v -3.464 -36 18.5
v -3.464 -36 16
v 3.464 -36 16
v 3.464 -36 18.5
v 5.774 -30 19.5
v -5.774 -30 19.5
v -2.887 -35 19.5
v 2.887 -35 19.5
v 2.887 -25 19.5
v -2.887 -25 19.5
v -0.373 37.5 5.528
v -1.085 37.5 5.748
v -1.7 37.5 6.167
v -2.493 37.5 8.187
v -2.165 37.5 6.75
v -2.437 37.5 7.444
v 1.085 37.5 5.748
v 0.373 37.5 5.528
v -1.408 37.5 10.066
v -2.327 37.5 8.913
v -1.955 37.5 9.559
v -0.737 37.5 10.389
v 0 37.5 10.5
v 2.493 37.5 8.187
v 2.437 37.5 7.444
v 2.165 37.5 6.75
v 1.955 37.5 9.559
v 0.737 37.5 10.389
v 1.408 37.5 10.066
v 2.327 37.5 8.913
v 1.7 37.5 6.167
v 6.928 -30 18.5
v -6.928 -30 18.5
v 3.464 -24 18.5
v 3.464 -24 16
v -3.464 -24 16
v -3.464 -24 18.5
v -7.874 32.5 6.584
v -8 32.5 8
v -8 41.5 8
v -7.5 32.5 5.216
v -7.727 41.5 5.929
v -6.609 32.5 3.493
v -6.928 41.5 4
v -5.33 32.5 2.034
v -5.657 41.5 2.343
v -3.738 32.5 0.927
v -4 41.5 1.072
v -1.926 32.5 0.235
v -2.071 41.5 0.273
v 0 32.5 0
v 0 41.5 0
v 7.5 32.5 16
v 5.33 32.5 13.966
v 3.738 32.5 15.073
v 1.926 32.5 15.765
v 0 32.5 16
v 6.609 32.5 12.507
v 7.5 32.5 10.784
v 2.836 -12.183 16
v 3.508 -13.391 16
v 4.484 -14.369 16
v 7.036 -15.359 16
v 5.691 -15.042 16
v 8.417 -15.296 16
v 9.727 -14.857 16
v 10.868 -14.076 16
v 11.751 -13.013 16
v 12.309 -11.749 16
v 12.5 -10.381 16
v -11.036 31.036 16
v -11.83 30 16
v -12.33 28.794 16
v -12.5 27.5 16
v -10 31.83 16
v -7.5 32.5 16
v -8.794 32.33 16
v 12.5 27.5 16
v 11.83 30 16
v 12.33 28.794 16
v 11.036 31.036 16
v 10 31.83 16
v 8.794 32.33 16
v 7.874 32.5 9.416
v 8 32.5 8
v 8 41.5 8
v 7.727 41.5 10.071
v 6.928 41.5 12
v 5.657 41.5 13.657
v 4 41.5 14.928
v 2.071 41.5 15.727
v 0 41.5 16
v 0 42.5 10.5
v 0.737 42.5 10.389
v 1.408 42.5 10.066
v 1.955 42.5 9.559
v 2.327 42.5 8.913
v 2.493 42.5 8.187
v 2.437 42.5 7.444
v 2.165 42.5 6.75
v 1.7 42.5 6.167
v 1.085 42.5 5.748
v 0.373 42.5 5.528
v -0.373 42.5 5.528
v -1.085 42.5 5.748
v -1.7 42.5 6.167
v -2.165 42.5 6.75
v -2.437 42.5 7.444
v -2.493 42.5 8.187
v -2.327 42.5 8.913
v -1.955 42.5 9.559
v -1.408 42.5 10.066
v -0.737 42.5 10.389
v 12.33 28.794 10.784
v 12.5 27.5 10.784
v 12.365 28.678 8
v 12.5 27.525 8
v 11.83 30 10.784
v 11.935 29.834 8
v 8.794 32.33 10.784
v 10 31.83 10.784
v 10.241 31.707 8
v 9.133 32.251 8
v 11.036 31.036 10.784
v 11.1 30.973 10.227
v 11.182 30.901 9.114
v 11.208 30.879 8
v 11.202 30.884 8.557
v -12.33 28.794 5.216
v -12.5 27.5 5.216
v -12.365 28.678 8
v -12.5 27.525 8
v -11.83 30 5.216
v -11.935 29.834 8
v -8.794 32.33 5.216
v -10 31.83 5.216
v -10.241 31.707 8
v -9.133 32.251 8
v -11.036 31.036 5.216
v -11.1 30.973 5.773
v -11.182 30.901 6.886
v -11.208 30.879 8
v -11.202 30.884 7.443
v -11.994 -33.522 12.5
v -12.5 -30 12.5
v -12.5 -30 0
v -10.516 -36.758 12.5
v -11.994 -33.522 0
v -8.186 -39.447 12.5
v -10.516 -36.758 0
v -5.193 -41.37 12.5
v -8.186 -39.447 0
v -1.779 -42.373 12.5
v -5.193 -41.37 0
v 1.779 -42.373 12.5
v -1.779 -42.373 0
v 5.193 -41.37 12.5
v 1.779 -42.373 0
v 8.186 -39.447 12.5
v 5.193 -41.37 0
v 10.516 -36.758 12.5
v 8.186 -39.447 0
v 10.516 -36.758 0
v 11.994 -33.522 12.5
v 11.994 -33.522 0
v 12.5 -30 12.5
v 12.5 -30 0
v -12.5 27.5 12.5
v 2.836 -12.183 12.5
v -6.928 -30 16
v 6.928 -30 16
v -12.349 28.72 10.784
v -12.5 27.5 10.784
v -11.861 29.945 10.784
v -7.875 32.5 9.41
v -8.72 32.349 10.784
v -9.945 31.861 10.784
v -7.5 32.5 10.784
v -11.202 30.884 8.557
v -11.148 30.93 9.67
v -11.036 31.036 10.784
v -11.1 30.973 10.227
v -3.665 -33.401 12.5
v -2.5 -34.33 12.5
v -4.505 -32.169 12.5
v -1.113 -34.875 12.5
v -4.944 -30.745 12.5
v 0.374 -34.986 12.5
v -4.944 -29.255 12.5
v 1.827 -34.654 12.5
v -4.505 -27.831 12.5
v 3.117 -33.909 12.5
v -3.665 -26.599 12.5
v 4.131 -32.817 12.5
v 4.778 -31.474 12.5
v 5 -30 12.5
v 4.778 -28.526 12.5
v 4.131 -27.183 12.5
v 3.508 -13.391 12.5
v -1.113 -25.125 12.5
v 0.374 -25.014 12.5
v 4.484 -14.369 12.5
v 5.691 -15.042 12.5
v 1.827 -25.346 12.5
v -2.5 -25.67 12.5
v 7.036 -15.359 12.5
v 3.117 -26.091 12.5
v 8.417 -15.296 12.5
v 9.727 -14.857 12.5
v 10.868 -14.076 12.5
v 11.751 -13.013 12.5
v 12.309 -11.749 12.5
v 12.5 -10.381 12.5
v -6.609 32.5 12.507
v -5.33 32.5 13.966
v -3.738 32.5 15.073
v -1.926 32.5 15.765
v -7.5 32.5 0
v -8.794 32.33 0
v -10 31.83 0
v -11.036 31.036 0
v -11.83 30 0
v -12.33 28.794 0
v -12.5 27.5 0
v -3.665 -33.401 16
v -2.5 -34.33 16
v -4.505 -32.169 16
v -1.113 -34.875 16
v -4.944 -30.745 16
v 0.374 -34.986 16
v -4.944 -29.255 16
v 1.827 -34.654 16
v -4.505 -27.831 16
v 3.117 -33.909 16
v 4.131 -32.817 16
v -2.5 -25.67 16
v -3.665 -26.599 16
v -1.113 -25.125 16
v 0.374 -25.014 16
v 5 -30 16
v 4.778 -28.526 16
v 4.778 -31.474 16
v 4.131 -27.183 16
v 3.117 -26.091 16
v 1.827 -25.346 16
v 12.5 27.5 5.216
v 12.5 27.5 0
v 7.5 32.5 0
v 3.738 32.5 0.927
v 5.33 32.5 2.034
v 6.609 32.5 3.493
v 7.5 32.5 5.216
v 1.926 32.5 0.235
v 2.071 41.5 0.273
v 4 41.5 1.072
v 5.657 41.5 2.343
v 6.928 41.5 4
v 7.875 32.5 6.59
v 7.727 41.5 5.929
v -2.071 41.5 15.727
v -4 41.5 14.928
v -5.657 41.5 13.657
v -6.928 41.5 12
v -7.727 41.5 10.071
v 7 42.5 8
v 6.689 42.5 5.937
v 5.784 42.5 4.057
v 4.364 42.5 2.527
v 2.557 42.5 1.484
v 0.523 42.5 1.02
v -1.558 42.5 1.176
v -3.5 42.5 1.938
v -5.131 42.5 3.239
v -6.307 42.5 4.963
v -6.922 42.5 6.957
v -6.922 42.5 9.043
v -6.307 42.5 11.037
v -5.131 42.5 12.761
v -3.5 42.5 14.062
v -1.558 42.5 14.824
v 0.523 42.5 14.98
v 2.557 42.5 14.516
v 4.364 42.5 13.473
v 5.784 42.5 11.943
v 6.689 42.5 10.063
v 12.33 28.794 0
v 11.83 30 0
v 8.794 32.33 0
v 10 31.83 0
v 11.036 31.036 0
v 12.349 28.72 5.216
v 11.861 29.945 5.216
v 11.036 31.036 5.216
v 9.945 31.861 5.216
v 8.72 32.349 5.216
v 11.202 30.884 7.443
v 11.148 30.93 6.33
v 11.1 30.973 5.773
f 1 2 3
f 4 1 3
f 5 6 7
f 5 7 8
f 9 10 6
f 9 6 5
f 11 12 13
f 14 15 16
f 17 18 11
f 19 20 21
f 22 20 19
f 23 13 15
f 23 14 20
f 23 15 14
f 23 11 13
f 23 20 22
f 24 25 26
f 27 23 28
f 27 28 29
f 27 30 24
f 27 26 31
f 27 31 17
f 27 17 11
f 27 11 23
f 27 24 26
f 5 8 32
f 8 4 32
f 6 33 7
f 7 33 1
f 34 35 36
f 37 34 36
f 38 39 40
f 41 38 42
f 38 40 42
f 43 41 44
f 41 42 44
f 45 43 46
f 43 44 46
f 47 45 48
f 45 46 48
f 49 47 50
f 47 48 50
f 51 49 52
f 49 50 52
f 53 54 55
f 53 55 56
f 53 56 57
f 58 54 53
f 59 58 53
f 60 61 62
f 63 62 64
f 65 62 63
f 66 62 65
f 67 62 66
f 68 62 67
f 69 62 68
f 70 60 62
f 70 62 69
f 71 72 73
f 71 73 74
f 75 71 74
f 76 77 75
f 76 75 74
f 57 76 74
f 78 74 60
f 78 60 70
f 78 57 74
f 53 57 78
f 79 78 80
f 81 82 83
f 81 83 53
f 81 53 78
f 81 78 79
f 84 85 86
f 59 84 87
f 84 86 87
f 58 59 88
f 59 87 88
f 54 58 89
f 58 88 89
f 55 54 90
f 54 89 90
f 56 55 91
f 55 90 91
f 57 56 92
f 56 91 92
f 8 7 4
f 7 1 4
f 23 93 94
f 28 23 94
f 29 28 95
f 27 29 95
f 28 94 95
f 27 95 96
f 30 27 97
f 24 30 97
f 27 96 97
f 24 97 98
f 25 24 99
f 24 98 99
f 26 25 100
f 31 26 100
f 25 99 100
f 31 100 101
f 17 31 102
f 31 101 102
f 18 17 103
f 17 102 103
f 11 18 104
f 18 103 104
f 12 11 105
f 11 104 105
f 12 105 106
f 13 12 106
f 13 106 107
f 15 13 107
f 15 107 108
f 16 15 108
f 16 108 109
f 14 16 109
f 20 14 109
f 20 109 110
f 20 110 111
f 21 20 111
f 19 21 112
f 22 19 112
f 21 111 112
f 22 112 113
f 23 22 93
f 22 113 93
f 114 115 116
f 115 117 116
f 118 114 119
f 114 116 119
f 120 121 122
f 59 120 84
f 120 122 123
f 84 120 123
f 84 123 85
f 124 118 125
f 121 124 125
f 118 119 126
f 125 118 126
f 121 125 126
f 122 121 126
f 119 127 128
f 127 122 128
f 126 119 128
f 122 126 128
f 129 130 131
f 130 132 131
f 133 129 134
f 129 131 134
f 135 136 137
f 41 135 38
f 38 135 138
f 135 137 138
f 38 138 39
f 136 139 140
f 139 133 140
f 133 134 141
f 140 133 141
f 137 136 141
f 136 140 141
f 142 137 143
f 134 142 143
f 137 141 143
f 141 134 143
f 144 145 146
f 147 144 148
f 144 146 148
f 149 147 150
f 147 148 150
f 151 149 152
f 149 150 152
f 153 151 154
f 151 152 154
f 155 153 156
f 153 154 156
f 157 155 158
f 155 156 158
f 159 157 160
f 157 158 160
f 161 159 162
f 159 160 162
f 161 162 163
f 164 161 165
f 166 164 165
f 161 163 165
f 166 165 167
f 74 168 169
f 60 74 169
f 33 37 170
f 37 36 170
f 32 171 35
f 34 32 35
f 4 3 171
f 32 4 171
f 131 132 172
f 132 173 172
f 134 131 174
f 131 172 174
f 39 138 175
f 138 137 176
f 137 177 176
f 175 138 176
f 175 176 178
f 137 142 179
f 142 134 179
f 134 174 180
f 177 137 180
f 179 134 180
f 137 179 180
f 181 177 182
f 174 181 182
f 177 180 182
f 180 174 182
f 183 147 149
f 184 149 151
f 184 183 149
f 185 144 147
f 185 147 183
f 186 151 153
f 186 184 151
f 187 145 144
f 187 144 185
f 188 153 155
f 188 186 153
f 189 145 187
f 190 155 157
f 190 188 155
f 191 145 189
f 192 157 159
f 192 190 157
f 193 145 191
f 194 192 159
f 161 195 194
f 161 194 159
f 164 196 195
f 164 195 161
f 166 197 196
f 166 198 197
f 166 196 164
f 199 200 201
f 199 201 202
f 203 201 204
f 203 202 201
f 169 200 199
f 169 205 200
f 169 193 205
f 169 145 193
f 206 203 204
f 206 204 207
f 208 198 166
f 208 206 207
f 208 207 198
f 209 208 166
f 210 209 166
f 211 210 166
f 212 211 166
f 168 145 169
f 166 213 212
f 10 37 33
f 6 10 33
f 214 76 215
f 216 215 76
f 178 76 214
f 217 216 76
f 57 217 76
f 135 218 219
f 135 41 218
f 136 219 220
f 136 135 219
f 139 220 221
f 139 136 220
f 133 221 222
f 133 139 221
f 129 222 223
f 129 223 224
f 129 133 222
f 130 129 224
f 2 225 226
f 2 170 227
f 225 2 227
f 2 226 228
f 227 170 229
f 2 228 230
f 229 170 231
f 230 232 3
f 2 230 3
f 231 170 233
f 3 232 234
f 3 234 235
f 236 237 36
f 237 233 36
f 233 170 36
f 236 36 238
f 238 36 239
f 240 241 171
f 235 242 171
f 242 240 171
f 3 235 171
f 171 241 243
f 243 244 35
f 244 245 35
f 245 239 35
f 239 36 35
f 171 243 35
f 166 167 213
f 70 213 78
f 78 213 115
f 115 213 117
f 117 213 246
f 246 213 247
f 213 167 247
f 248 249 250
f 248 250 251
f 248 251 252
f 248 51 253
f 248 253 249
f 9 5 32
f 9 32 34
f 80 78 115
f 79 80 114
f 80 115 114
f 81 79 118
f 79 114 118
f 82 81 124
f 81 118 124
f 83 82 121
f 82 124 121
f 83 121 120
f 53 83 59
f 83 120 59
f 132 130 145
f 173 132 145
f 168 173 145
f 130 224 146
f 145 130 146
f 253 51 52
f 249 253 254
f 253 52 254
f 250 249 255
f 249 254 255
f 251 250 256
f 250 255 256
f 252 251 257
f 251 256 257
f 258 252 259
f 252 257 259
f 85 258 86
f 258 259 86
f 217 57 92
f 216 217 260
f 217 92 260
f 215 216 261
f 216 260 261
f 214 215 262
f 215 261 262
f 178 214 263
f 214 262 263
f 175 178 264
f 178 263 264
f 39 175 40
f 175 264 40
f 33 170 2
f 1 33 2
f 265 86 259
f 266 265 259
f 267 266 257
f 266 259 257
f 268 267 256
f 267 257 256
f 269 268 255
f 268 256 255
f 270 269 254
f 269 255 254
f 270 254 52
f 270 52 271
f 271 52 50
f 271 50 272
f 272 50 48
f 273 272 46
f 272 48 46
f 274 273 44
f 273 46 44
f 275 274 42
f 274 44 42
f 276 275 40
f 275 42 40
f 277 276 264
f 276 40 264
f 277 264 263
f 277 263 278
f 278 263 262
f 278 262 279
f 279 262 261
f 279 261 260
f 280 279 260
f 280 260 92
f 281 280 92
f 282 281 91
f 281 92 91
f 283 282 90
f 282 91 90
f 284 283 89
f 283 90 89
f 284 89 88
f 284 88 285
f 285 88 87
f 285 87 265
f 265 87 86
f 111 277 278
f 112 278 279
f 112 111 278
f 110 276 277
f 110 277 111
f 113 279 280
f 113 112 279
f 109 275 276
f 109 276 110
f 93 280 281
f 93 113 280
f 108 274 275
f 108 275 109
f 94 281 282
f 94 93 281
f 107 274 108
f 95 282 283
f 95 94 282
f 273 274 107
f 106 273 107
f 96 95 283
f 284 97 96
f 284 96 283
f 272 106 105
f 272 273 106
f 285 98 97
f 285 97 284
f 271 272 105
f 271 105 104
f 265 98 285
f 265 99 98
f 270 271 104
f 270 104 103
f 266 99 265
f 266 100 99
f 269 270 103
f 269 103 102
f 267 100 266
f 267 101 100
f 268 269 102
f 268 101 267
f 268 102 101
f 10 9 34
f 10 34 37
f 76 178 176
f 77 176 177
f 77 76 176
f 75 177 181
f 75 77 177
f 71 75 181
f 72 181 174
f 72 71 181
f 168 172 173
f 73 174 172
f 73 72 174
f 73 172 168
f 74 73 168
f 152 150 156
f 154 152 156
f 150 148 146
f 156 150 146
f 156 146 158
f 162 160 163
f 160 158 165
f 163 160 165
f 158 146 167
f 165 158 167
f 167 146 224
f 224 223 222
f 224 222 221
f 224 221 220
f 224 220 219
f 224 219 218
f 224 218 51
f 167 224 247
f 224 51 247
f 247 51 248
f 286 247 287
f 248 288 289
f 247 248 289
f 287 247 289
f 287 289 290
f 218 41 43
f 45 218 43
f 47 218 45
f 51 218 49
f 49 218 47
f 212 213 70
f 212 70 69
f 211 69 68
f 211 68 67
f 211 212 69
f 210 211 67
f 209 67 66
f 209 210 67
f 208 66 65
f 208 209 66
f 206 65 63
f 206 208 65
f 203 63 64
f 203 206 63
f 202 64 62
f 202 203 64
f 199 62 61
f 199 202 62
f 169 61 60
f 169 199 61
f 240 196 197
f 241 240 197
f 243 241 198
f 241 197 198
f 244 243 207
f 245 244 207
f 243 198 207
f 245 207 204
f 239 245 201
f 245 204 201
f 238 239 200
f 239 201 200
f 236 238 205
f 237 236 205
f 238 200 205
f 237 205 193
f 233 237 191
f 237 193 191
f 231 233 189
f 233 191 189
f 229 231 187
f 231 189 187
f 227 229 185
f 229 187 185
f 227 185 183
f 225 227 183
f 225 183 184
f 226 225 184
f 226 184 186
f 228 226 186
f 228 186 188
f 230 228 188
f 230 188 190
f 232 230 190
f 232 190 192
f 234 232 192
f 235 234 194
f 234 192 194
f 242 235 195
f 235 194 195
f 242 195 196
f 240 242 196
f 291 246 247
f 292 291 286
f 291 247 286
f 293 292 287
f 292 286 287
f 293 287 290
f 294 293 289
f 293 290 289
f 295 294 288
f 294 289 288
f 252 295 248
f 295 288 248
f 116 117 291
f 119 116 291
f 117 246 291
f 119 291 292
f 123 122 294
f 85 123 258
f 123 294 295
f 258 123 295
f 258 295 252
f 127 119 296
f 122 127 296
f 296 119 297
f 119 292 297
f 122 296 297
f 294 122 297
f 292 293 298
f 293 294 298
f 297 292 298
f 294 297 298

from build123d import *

# Parameters (mm, degrees)
CROQUIS1_W              = 25
CROQUIS1_H              = 12.5
SALIENTE_EXTRUIR2_DEPTH = 16
CORTAR_EXTRUIR3_START   = -3.5
CROQUIS2_R              = 12.5
CROQUIS2_R_2            = 5
CORTAR_EXTRUIR3_DEPTH   = 3.5
REDONDEO5_R             = 5
REDONDEO6_R             = 5
SALIENTE_EXTRUIR3_DEPTH = 3.5
CHAFL_N1_SIZE           = 1
CHAFL_N2_SIZE           = 1
CHAFL_N3_SIZE           = 1
CHAFL_N4_SIZE           = 1
CHAFL_N5_SIZE           = 1
CHAFL_N6_SIZE           = 1
CORTAR_EXTRUIR5_DEPTH   = 10
REDONDEO9_R             = 5
REDONDEO10_R            = 5
CROQUIS5_R              = 2.5
CORTAR_EXTRUIR6_DEPTH   = 5
CORTAR_EXTRUIR9_START   = -3.5
CORTAR_EXTRUIR9_DEPTH   = 3.5
REDONDEO12_START        = 12.5
REDONDEO12_DEPTH        = 4.5


with BuildPart() as part:
    # Croquis1 → Saliente-Extruir2 (new body)
    with BuildSketch(Plane.XY):
        with Locations((0, 36.25)):
            Rectangle(CROQUIS1_W, CROQUIS1_H)
        with Locations((0, 23.75)):
            Rectangle(CROQUIS1_W, CROQUIS1_H)
        with BuildLine():
            Line((-12.5, 17.5), (-12.5, -30))
            ThreePointArc((-12.5, -30), (0, -17.5), (12.5, -30))
            Line((12.5, -30), (12.5, 17.5))
            Line((12.5, 17.5), (-12.5, 17.5))
        make_face()
        with BuildLine():
            ThreePointArc((12.5, -30), (0, -17.5), (-12.5, -30))
            Line((-12.5, -30), (12.5, -30))
        make_face()
        with BuildLine():
            Line((12.5, -30), (-12.5, -30))
            ThreePointArc((-12.5, -30), (0, -42.5), (12.5, -30))
        make_face()
    extrude(amount=SALIENTE_EXTRUIR2_DEPTH)

    # Croquis2 → Cortar-Extruir3 (cut)
    with BuildSketch(Plane.XY.offset(16).offset(CORTAR_EXTRUIR3_START)):
        with Locations((0, -30)):
            Circle(CROQUIS2_R)
        with Locations((0, -30)):
            Circle(CROQUIS2_R_2, mode=Mode.SUBTRACT)
    extrude(amount=CORTAR_EXTRUIR3_DEPTH, mode=Mode.SUBTRACT)

    # Redondeo5
    redondeo5_edges = [part.edges().sort_by_distance(p)[0] for p in [
        (-12.5, -30, 14.25),
    ]]
    fillet(redondeo5_edges, radius=REDONDEO5_R)

    # Redondeo6
    redondeo6_edges = [part.edges().sort_by_distance(p)[0] for p in [
        (12.5, -30, 14.25),
    ]]
    fillet(redondeo6_edges, radius=REDONDEO6_R)

    # Croquis3 → Saliente-Extruir3 (add)
    with BuildSketch(Plane.XY.offset(16)):
        Polygon((6.92820323, -30), (3.464101615, -24), (-3.464101615, -24), (-6.92820323, -30), (-3.464101615, -36), (3.464101615, -36), align=None)
    extrude(amount=SALIENTE_EXTRUIR3_DEPTH)

    # Chaflán1
    chafl_n1_edges = [part.edges().sort_by_distance(p)[0] for p in [
        (5.196152423, -27, 19.5),
    ]]
    chamfer(chafl_n1_edges, length=CHAFL_N1_SIZE)

    # Chaflán2
    chafl_n2_edges = [part.edges().sort_by_distance(p)[0] for p in [
        (-0.577350269, -24, 19.5),
    ]]
    chamfer(chafl_n2_edges, length=CHAFL_N2_SIZE)

    # Chaflán3
    chafl_n3_edges = [part.edges().sort_by_distance(p)[0] for p in [
        (4.907477288, -33.5, 19.5),
    ]]
    chamfer(chafl_n3_edges, length=CHAFL_N3_SIZE)

    # Chaflán4
    chafl_n4_edges = [part.edges().sort_by_distance(p)[0] for p in [
        (-0.577350269, -36, 19.5),
    ]]
    chamfer(chafl_n4_edges, length=CHAFL_N4_SIZE)

    # Chaflán5
    chafl_n5_edges = [part.edges().sort_by_distance(p)[0] for p in [
        (-5.484827557, -32.5, 19.5),
    ]]
    chamfer(chafl_n5_edges, length=CHAFL_N5_SIZE)

    # Chaflán6
    chafl_n6_edges = [part.edges().sort_by_distance(p)[0] for p in [
        (-5.196152423, -27, 19.5),
    ]]
    chamfer(chafl_n6_edges, length=CHAFL_N6_SIZE)

    # Croquis4 → Cortar-Extruir5 (cut)
    with BuildSketch(Plane(origin=(0, 42.5, 0), x_dir=(1, 0, 0), z_dir=(0, 1, 0))):
        with BuildLine():
            ThreePointArc((-8, -8), (-5.656854249, -2.343145751), (0, 0))
            Line((0, 0), (-12.5, 0))
            Line((-12.5, 0), (-12.5, -8))
            Line((-12.5, -8), (-8, -8))
        make_face()
        with BuildLine():
            ThreePointArc((0, -16), (-5.656854249, -13.656854249), (-8, -8))
            Line((-8, -8), (-12.5, -8))
            Line((-12.5, -8), (-12.5, -16))
            Line((-12.5, -16), (0, -16))
        make_face()
        with BuildLine():
            Line((12.5, -8), (8, -8))
            ThreePointArc((8, -8), (5.656854249, -13.656854249), (0, -16))
            Line((0, -16), (12.5, -16))
            Line((12.5, -16), (12.5, -8))
        make_face()
        with BuildLine():
            Line((12.5, 0), (0, 0))
            ThreePointArc((0, 0), (5.656854249, -2.343145751), (8, -8))
            Line((8, -8), (12.5, -8))
            Line((12.5, -8), (12.5, 0))
        make_face()
    extrude(amount=-CORTAR_EXTRUIR5_DEPTH, mode=Mode.SUBTRACT)

    # Redondeo9
    redondeo9_edges = [part.edges().sort_by_distance(p)[0] for p in [
        (12.5, 32.5, 8),
    ]]
    fillet(redondeo9_edges, radius=REDONDEO9_R)

    # Redondeo10
    redondeo10_edges = [part.edges().sort_by_distance(p)[0] for p in [
        (-12.5, 32.5, 8),
    ]]
    fillet(redondeo10_edges, radius=REDONDEO10_R)

    # Croquis5 → Cortar-Extruir6 (cut)
    with BuildSketch(Plane(origin=(0, 42.5, 0), x_dir=(1, 0, 0), z_dir=(0, 1, 0))):
        with Locations(Location((0, -8, 0), (0, 0, 270))):
            Circle(CROQUIS5_R)
    extrude(amount=-CORTAR_EXTRUIR6_DEPTH, mode=Mode.SUBTRACT)

    # Chaflán7: read off the stored shape, not the designer's step
    # Chaflán7 outline → Chaflán7 (revolve, cut)
    with BuildSketch(Plane.XY.offset(8)):
        Polygon((8, 42.5), (7, 42.5), (8, 41.5), align=None)
    revolve(axis=Axis((0, 0, 8), (0, 1, 0)), mode=Mode.SUBTRACT)

    # Croquis7 → Cortar-Extruir9 (cut)
    with BuildSketch(Plane.XY.offset(16).offset(CORTAR_EXTRUIR9_START)):
        with BuildLine():
            Line((-12.5, 27.5), (5.357142857, -18.706151214))
            ThreePointArc((5.357142857, -18.706151214), (0, -17.5), (-5.357142857, -18.706151214))
            ThreePointArc((-5.357142857, -18.706151214), (-10.172612419, -18.414382973), (-12.5, -14.188611699))
            Line((-12.5, -14.188611699), (-12.5, 27.5))
        make_face()
    extrude(amount=CORTAR_EXTRUIR9_DEPTH, mode=Mode.SUBTRACT)

    # Redondeo12: read off the stored shape, not the designer's step
    # Redondeo12 outline → Redondeo12 (cut)
    with BuildSketch(Plane.XY.offset(REDONDEO12_START)):
        with BuildLine():
            ThreePointArc((12.5, -10.380609645), (8.416748435, -15.29584843), (2.836171077, -12.18302463))
            Line((2.836171077, -12.18302463), (5.357142857, -18.706151214))
            ThreePointArc((5.357142857, -18.706151214), (10.172612419, -18.414382973), (12.5, -14.188611699))
            Line((12.5, -14.188611699), (12.5, -10.380609645))
        make_face()
    extrude(amount=REDONDEO12_DEPTH, mode=Mode.SUBTRACT)


solid = part.part
